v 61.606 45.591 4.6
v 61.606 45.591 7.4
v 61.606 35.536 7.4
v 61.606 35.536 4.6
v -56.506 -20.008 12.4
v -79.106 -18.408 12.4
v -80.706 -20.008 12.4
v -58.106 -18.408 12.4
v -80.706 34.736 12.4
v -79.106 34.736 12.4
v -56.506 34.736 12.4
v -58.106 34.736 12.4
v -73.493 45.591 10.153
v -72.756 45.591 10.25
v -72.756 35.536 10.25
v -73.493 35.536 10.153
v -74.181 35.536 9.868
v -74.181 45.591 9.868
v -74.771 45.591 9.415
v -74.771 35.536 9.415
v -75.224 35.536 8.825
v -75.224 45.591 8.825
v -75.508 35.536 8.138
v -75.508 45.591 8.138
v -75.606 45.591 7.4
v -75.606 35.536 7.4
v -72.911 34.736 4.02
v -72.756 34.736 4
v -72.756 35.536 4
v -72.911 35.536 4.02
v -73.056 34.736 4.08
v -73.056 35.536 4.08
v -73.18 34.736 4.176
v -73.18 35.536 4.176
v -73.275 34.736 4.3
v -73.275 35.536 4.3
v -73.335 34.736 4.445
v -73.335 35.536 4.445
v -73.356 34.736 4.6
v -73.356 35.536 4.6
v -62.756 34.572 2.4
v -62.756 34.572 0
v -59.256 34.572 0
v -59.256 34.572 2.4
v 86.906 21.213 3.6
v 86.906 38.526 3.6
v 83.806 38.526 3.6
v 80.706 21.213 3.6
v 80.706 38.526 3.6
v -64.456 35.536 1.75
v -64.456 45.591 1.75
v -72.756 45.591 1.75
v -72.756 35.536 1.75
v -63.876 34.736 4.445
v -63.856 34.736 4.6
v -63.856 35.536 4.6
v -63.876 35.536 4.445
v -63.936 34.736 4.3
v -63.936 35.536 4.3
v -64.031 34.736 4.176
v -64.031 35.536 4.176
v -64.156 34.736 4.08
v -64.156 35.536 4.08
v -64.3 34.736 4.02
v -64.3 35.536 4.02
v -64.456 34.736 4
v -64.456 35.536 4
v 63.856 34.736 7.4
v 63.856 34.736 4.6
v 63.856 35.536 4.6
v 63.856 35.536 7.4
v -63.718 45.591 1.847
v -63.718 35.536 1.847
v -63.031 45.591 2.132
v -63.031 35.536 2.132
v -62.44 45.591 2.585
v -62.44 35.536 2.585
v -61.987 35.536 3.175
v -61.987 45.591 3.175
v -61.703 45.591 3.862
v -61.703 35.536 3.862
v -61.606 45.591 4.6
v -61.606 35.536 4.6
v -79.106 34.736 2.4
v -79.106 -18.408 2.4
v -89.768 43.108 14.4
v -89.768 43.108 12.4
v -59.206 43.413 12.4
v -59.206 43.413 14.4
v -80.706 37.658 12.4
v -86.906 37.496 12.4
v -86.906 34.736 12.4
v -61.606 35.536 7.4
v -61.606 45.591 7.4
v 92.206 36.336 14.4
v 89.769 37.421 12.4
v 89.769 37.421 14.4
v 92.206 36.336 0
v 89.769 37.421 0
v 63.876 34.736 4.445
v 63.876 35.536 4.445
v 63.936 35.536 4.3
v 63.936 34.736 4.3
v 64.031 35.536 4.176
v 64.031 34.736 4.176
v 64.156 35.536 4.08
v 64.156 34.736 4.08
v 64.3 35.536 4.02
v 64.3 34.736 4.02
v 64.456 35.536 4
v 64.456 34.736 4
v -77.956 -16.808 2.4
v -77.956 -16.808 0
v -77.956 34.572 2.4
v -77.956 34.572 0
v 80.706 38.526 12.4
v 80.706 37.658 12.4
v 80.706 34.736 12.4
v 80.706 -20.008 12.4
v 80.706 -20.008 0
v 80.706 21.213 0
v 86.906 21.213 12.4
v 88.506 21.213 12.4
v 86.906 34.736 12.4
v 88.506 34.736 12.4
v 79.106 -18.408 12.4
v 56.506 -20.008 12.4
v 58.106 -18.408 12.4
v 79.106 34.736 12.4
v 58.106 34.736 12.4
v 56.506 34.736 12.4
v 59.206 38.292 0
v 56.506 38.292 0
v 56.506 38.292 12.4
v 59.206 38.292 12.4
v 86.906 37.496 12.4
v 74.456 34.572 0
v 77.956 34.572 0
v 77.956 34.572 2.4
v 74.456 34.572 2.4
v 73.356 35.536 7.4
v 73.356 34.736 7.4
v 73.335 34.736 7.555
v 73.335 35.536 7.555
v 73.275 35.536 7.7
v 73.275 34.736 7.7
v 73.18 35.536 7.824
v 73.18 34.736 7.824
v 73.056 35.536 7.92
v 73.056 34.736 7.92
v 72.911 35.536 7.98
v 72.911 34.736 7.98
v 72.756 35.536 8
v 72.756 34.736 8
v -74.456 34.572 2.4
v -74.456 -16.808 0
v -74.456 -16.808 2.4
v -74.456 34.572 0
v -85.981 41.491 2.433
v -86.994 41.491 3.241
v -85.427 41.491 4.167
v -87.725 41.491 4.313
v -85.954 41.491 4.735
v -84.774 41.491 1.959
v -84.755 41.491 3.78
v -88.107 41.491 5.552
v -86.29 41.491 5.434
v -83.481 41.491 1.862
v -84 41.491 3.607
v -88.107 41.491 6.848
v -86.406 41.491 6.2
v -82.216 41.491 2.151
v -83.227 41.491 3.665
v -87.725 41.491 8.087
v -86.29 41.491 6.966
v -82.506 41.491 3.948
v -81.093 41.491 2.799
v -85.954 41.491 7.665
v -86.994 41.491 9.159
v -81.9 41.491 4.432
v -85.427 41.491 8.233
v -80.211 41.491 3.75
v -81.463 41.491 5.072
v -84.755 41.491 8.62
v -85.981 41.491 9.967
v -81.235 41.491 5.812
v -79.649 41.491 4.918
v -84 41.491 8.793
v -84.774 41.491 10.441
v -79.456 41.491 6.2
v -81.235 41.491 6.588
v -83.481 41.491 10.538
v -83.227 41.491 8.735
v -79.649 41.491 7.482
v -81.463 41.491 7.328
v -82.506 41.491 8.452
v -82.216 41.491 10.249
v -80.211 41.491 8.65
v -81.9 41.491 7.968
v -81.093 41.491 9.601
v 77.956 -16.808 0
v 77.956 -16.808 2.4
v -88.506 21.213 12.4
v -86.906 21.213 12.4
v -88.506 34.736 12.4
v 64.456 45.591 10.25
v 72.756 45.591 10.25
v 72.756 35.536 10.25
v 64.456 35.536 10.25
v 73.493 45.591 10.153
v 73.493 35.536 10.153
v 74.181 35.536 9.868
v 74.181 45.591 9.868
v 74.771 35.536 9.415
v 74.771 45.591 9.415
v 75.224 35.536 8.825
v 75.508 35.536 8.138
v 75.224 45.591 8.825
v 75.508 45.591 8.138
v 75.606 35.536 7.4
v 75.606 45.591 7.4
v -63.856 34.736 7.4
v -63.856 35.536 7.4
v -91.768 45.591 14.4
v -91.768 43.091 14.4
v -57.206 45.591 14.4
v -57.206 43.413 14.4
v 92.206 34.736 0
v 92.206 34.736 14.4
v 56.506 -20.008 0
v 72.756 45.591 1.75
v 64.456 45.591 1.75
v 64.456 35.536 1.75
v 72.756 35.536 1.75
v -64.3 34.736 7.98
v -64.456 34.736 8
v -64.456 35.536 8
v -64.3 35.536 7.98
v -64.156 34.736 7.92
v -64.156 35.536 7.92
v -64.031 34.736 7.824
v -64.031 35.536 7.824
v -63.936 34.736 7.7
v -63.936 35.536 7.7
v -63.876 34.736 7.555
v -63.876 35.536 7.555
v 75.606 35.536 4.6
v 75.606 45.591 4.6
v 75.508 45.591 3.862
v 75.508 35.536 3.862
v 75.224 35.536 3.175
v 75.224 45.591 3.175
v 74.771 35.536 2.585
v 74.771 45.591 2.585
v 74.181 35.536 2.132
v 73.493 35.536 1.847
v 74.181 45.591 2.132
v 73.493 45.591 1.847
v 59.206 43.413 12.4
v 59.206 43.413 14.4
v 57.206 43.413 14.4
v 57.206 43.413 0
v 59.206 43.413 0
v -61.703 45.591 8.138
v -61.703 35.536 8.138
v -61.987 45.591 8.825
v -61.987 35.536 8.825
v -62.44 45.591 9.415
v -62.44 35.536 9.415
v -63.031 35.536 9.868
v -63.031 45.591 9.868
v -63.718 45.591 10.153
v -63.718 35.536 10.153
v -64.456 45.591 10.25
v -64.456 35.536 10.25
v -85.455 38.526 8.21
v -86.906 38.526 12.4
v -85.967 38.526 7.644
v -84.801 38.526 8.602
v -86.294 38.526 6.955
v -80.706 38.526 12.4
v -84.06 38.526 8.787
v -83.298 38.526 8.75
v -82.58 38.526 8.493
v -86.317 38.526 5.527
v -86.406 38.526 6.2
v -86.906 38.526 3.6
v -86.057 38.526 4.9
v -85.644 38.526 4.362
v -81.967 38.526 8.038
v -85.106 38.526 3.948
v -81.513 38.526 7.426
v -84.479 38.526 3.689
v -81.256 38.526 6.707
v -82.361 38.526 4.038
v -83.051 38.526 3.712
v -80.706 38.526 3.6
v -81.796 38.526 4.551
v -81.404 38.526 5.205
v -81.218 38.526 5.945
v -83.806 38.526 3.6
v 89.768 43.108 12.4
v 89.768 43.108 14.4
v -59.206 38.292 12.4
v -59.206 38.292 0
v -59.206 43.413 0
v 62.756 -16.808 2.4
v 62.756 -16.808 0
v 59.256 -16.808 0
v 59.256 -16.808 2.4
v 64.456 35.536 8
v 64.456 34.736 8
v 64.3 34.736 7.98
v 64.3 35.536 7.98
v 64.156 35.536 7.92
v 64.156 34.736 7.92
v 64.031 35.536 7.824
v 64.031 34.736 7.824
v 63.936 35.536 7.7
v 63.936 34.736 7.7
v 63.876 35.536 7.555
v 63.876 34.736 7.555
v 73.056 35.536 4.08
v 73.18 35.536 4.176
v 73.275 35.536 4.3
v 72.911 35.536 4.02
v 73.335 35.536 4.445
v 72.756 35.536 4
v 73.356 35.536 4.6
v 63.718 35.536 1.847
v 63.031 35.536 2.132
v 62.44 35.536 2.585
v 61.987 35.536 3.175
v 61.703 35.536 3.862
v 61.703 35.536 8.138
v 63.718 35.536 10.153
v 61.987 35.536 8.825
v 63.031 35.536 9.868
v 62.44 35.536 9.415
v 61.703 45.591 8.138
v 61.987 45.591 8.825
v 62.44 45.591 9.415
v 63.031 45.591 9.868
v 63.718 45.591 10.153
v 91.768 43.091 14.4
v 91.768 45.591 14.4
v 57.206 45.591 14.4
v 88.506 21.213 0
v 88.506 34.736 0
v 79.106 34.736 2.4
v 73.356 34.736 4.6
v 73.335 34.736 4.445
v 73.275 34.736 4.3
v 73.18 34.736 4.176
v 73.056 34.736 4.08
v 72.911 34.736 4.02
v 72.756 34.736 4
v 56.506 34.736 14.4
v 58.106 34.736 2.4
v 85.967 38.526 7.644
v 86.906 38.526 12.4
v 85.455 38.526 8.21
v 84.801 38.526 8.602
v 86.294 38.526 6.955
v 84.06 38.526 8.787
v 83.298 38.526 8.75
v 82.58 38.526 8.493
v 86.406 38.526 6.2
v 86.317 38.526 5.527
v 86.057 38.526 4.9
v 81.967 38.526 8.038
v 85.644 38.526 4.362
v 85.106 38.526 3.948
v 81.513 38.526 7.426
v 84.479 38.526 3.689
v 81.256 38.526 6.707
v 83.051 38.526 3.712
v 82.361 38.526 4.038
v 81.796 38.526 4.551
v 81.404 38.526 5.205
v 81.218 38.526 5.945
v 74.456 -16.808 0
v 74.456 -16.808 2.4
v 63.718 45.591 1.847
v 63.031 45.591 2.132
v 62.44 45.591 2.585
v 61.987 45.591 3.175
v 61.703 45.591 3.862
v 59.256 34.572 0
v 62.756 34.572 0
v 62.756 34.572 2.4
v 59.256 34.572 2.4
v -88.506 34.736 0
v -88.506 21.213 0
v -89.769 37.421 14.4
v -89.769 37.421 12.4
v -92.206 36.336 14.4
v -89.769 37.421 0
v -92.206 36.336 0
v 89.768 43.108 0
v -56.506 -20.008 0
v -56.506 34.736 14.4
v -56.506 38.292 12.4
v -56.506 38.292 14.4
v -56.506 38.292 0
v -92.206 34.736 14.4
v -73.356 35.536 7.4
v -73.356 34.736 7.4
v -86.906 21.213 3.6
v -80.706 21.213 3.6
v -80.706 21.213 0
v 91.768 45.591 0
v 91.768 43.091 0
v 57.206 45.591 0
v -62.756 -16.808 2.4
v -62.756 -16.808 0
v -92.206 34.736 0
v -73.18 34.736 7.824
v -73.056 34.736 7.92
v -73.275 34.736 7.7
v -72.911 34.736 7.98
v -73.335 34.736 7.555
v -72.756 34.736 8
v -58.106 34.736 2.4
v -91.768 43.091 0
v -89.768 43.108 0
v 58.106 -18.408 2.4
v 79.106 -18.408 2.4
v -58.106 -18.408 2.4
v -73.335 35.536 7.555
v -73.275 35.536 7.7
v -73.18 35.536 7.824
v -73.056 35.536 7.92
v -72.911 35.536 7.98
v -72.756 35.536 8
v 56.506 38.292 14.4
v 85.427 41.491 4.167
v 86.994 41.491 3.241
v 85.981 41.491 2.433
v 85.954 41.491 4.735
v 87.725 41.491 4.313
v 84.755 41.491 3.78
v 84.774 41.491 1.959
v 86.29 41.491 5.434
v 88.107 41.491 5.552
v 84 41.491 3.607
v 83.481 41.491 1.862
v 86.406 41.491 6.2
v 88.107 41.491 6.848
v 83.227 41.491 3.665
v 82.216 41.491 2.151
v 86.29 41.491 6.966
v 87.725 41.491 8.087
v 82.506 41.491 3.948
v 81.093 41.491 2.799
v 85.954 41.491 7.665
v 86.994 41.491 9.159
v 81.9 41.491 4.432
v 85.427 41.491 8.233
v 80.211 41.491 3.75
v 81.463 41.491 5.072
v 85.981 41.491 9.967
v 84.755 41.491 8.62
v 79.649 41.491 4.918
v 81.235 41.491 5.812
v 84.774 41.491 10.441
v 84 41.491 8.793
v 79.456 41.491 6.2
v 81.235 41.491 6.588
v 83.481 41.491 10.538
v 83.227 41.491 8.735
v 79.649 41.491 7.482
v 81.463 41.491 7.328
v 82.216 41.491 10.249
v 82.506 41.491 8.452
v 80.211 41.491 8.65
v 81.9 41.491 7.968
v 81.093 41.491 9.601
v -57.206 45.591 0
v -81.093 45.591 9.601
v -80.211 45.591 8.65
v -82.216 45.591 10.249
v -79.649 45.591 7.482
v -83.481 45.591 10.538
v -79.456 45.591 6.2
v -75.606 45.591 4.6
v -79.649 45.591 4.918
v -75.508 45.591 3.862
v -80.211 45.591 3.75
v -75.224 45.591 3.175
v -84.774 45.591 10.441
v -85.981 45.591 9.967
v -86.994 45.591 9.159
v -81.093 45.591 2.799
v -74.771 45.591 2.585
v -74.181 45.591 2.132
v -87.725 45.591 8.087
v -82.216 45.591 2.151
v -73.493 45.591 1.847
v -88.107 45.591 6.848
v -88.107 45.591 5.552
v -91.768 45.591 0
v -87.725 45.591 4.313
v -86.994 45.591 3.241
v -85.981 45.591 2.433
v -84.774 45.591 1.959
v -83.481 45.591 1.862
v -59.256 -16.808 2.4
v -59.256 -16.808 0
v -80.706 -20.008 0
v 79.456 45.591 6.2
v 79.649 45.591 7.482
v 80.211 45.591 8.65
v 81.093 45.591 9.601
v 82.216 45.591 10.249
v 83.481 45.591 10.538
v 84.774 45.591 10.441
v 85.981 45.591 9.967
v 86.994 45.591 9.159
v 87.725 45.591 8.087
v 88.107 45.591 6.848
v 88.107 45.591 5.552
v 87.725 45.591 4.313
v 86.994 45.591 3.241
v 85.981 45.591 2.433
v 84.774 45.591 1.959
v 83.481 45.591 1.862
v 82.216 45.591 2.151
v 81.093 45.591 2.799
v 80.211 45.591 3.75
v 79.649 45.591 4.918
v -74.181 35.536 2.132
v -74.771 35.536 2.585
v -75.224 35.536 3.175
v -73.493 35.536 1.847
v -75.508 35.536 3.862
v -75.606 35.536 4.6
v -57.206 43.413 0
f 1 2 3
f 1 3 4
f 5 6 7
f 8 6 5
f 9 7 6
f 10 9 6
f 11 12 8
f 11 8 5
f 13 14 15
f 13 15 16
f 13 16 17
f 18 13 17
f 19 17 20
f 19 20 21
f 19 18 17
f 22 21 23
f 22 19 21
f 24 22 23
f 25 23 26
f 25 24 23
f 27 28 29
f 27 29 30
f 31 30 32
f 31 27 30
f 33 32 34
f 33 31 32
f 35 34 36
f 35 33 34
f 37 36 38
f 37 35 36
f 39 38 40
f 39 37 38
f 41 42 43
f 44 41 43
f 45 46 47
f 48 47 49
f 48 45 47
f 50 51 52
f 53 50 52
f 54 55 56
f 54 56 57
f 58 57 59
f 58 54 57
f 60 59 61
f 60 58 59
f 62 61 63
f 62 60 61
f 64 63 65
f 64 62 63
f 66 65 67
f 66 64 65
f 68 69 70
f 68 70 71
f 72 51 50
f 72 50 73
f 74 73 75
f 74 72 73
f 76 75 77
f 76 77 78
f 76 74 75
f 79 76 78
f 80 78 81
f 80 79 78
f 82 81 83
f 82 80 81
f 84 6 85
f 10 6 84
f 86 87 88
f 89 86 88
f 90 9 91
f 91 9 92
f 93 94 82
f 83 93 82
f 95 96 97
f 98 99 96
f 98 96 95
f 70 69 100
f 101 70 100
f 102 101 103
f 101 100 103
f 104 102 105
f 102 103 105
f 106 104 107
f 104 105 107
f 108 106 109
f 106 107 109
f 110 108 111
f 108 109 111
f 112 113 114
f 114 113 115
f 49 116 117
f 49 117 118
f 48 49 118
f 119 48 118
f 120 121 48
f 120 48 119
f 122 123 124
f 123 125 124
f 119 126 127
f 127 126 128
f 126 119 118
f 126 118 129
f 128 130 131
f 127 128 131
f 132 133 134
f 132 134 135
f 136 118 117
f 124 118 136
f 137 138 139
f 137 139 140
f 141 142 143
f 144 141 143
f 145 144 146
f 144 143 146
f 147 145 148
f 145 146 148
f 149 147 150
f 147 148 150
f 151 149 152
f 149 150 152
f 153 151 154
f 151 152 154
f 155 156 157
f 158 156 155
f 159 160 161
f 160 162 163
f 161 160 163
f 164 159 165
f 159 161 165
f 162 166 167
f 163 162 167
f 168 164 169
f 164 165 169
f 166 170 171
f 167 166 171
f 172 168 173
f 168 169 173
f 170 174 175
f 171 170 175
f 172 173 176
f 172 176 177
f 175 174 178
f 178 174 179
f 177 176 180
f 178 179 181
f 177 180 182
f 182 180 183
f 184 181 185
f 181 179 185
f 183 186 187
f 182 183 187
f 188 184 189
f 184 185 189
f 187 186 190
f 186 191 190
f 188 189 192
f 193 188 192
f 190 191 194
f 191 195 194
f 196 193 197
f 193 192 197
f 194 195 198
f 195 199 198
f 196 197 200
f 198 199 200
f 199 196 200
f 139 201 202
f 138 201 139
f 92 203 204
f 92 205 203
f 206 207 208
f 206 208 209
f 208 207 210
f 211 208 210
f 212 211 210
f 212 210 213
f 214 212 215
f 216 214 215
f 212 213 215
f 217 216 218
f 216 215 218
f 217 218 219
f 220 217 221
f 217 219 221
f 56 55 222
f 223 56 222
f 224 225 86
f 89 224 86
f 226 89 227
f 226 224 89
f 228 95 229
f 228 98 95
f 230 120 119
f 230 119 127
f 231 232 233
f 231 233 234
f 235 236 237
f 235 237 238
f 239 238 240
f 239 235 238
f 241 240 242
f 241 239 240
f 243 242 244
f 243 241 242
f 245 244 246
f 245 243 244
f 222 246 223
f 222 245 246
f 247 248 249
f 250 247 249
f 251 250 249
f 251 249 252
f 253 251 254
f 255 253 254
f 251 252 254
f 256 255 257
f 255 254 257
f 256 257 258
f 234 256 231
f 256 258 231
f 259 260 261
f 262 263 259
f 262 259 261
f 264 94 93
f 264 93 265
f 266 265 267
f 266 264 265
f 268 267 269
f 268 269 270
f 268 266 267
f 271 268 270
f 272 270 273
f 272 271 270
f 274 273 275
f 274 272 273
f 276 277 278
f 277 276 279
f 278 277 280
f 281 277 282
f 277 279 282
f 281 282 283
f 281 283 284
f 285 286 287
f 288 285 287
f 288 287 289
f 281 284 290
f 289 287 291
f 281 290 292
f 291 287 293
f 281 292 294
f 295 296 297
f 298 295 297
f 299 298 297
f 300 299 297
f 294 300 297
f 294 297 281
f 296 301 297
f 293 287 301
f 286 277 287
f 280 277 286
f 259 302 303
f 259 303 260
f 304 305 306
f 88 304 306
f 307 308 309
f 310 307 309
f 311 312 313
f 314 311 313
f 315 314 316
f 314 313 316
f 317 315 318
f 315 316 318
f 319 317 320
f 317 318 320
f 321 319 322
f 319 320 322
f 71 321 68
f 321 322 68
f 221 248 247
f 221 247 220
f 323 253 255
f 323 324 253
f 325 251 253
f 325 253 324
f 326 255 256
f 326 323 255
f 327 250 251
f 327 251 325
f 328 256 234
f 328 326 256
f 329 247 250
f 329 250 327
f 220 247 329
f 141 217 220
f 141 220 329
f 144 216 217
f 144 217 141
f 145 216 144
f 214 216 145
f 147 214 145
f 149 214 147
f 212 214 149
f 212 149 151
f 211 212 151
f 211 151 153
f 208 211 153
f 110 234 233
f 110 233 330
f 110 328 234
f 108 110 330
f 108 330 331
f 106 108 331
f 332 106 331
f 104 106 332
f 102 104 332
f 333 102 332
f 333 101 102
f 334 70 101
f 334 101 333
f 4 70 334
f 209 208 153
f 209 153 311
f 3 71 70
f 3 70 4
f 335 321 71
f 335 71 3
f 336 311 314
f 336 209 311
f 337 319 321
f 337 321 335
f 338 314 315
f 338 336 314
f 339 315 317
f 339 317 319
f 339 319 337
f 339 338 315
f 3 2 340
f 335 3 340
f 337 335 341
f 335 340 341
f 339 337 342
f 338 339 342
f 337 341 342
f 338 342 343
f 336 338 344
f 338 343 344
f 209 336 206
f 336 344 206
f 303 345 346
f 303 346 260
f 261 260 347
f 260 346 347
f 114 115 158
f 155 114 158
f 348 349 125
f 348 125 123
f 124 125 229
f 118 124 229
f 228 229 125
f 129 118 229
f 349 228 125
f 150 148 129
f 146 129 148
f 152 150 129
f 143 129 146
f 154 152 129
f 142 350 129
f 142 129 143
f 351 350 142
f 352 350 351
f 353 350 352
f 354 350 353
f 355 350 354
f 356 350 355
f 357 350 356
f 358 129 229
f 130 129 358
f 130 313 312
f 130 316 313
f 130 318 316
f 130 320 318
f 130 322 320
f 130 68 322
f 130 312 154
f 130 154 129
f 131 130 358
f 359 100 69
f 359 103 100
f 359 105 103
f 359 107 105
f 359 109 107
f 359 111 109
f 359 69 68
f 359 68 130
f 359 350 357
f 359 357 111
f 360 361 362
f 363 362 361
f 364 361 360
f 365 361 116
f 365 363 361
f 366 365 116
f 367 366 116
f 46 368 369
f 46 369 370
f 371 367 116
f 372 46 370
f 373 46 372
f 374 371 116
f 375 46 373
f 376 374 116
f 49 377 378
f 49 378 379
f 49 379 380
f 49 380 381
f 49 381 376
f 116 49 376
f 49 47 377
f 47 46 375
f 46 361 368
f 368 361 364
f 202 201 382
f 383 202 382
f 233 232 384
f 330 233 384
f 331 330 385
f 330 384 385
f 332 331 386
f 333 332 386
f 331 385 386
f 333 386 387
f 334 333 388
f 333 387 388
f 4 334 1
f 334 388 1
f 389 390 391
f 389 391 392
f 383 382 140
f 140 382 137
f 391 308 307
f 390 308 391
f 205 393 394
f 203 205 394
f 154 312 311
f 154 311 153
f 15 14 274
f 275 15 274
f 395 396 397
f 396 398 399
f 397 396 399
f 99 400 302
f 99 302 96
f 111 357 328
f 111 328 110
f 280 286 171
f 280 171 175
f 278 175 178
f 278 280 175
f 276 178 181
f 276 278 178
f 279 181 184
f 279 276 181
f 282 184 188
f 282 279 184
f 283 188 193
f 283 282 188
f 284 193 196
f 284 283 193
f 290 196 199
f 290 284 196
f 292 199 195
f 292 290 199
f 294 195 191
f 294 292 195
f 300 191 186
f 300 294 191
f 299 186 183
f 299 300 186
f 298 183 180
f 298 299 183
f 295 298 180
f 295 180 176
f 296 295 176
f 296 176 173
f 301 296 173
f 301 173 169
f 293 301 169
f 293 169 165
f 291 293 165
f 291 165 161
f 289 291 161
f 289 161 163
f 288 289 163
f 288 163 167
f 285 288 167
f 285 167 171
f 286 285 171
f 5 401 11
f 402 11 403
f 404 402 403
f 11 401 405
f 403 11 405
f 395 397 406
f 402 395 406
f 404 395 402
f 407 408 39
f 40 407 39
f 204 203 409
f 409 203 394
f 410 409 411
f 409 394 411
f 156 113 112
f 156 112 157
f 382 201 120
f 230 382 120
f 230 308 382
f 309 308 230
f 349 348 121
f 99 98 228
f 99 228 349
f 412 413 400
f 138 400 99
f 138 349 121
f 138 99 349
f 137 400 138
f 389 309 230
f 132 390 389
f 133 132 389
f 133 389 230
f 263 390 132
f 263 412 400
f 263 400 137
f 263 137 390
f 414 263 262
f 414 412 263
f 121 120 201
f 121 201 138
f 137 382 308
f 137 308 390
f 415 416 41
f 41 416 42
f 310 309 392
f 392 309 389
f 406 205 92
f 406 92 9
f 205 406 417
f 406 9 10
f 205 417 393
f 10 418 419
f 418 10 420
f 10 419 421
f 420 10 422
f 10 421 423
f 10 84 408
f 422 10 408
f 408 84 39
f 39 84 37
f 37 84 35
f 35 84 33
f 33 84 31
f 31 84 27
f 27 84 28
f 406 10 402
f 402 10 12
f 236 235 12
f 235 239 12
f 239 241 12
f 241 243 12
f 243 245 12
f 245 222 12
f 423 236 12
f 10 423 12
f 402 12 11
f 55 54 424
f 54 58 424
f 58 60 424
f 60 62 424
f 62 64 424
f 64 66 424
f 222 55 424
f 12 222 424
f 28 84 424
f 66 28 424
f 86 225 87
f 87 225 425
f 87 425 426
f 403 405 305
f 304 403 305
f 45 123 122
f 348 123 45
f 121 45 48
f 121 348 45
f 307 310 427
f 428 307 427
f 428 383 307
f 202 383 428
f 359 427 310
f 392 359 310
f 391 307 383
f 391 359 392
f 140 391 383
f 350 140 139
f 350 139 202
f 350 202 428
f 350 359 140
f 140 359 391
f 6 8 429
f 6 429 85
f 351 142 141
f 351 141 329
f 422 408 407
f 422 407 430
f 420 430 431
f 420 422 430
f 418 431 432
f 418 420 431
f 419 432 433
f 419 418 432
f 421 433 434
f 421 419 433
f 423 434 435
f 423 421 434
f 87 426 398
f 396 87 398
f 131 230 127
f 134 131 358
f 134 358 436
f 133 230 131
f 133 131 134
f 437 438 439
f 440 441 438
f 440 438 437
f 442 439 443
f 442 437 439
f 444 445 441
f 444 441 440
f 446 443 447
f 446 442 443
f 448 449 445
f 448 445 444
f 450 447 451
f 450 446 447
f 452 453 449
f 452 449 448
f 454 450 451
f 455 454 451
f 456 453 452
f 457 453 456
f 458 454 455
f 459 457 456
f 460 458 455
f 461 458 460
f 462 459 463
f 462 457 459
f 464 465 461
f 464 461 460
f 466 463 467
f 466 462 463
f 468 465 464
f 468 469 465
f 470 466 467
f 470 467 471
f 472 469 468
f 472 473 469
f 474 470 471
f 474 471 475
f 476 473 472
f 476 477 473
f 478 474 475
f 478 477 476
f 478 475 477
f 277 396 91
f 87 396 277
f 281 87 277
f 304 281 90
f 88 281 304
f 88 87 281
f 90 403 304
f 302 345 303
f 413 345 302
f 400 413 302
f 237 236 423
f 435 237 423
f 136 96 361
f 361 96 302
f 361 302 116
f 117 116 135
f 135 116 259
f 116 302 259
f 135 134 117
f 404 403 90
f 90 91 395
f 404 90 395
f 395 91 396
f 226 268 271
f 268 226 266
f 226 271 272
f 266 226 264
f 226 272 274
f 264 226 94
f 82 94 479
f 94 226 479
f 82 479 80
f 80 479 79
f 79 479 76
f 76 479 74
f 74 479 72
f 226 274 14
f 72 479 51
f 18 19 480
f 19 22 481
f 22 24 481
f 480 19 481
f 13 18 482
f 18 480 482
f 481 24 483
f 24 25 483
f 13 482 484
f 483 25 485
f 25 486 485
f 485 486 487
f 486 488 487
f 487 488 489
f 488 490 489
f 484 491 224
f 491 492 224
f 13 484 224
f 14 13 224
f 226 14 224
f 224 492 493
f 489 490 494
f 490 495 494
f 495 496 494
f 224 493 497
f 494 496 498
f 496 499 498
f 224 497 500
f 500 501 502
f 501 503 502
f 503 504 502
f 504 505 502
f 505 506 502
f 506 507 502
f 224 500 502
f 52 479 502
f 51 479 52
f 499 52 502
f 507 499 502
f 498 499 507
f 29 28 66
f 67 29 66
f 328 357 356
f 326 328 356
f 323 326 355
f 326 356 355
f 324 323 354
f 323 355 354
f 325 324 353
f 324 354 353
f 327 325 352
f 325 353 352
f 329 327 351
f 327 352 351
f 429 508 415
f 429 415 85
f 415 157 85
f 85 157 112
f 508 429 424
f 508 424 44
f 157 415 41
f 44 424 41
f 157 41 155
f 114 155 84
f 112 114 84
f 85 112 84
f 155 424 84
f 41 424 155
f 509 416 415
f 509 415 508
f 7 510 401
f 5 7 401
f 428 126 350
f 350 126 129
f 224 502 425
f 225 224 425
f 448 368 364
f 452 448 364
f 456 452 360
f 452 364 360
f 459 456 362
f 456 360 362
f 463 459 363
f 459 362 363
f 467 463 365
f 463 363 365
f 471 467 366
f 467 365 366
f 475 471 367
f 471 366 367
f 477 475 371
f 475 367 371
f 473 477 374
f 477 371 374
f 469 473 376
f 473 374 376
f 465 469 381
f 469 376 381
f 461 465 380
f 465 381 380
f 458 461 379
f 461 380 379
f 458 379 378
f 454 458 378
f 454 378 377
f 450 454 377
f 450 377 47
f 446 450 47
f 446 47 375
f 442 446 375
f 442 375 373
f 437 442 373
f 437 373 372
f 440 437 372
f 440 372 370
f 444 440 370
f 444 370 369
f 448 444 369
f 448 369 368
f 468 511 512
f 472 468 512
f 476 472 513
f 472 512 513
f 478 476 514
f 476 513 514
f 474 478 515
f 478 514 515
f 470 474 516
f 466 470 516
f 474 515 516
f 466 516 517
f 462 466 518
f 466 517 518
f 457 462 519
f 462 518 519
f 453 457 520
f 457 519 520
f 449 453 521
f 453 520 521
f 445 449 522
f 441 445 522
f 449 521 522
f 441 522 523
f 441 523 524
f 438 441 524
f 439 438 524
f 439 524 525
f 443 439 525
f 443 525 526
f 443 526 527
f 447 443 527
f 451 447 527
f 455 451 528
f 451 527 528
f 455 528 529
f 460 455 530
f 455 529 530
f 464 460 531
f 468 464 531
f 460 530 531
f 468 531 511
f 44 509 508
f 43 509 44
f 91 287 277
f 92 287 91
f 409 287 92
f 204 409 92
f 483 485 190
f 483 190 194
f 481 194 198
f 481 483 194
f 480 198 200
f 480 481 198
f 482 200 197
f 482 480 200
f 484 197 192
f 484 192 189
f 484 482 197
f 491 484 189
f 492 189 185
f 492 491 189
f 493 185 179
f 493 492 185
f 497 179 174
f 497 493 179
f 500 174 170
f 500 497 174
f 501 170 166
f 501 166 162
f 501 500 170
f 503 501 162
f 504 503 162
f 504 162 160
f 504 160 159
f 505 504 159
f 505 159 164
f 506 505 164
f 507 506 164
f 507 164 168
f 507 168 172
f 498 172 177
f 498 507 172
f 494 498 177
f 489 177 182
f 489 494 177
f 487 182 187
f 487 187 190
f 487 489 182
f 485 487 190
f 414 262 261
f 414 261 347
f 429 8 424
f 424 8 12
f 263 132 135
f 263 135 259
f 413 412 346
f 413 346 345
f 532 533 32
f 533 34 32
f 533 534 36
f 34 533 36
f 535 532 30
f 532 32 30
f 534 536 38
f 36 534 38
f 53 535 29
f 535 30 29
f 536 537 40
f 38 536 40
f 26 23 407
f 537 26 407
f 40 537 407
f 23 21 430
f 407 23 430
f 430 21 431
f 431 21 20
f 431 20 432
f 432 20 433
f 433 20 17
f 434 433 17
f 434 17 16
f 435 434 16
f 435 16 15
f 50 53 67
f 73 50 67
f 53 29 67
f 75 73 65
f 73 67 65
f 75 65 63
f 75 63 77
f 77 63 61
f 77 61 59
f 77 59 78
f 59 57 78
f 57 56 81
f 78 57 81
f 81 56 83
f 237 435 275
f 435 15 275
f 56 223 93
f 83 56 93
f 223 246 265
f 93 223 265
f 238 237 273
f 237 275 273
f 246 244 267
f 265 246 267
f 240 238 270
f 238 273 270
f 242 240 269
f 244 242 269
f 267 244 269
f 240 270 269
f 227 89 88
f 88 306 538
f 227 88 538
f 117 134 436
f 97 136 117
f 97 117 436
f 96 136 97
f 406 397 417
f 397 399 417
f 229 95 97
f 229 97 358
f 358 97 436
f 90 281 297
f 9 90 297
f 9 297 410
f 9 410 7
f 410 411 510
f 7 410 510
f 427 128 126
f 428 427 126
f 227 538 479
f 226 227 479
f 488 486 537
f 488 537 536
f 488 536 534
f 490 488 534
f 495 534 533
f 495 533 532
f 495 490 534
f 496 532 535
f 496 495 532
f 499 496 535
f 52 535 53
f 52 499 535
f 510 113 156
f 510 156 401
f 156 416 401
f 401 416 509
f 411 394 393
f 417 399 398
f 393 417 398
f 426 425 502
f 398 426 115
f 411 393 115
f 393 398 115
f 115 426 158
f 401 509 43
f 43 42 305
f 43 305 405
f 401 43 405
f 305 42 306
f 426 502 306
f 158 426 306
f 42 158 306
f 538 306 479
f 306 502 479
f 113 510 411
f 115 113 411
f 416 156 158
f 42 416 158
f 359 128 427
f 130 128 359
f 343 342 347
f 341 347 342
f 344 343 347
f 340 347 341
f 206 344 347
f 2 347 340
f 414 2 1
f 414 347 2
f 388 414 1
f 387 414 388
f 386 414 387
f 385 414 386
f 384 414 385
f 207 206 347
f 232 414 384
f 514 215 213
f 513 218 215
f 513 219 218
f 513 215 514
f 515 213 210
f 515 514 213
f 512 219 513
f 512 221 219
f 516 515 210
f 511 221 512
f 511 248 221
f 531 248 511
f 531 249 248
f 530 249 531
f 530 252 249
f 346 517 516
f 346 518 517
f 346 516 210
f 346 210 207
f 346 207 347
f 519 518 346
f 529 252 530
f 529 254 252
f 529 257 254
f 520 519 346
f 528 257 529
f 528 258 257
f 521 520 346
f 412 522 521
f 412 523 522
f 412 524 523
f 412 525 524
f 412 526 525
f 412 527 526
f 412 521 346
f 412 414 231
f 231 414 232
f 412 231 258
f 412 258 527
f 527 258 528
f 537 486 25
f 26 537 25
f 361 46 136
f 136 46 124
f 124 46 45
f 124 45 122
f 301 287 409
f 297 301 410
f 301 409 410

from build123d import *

# Parameters (mm, degrees)
SKETCH008_W     = 3.5
SKETCH008_H     = 51.38
PAD002_DEPTH    = 12.4
PAD003_DEPTH    = 2
SKETCH010_W     = 21
SKETCH010_H     = 53.1439524112
POCKET006_DEPTH = 10
SKETCH011_R     = 2.6
POCKET007_DEPTH = 24.3796707343
POCKET008_DEPTH = 16.2235914112
SKETCH013_R     = 4.35
POCKET009_DEPTH = 4.1
POCKET010_DEPTH = 10.8560793232
POCKET011_DEPTH = 10.0550793232
POCKET_DEPTH    = 1.09
SKETCH016_W     = 3.5
SKETCH016_H     = 51.38
PAD004_DEPTH    = 12.4
PAD005_DEPTH    = 2
SKETCH018_W     = 21
SKETCH018_H     = 53.1439524112
POCKET013_DEPTH = 10
SKETCH019_R     = 2.6
POCKET014_DEPTH = 24.3796707343
POCKET015_DEPTH = 16.2235914112
SKETCH021_R     = 4.35
POCKET016_DEPTH = 4.1
POCKET017_DEPTH = 10.8560793232
POCKET018_DEPTH = 10.0550793232
POCKET012_DEPTH = 1.09


with BuildPart() as body001:
    # Sketch008 → Pad002 (new body)
    with BuildSketch(Plane(origin=(0, 0, 0), x_dir=(-1, 0, 0), z_dir=(0, 0, -1))):
        Polygon((-89.7690858187, 37.4209880882), (-92.205606, 36.3361794112), (-92.205606, 34.7361794112), (-88.505606, 34.7361794112), (-88.505606, 21.212588), (-80.705606, 21.212588), (-80.705606, -20.007773), (-56.505606, -20.007773), (-56.505606, 38.292227), (-59.205606, 38.292227), (-59.205606, 43.412588), (-57.205606, 43.412588), (-57.205606, 45.5912587343), (-91.7678030502, 45.5912587343), (-91.7678030502, 43.0912587343), (-89.7678755353, 43.1082862119), align=None)
        with Locations((-76.205606, 8.882227)):
            Rectangle(SKETCH008_W, SKETCH008_H, mode=Mode.SUBTRACT)
        with Locations((-61.005606, 8.882227)):
            Rectangle(SKETCH008_W, SKETCH008_H, mode=Mode.SUBTRACT)
    extrude(amount=-PAD002_DEPTH)

    # Sketch009 (on Face26 of Pad002) → Pad003 (join)
    with BuildSketch(Plane.XY.offset(12.4)):
        Polygon((92.205606, 34.7361794112), (56.505606, 34.7361794112), (56.505606, 38.292227), (89.7690858187, 37.4209880882), (92.205606, 36.3361794112), align=None)
        Polygon((59.205606, 43.412588), (57.205606, 43.412588), (57.205606, 45.5912587343), (91.7678030502, 45.5912587343), (91.7678030502, 43.0912587343), (89.7678755353, 43.1082862119), align=None)
    extrude(amount=PAD003_DEPTH)

    # Sketch010 (on Face36 of Pad003) → Pocket006 (cut)
    with BuildSketch(Plane.XY.offset(12.4)):
        with Locations((68.605606, 8.1642032056)):
            Rectangle(SKETCH010_W, SKETCH010_H)
    extrude(amount=-POCKET006_DEPTH, mode=Mode.SUBTRACT)

    # Sketch011 (on Face12 of Pocket006) → Pocket007 (cut, through all)
    with BuildSketch(Plane.XZ.offset(-21.212588)):
        with Locations((83.805606, 6.2)):
            Circle(SKETCH011_R)
    extrude(amount=-POCKET007_DEPTH, mode=Mode.SUBTRACT)

    # Sketch012 (on Face12 of Pocket007) → Pocket008 (cut)
    with BuildSketch(Plane.XZ.offset(-21.212588)):
        Polygon((86.905606, 8.8), (86.905606, 3.6), (80.705606, 3.6), (80.705606, 8.8), (80.705606, 12.4), (86.905606, 12.4), align=None)
    extrude(amount=-POCKET008_DEPTH, mode=Mode.SUBTRACT)

    # Sketch013 (on Face20 of Pocket008) → Pocket009 (cut)
    with BuildSketch(Plane(origin=(0, 45.5912587343, 0), x_dir=(-1, 0, 0), z_dir=(0, 1, 0))):
        with Locations((-83.805606, 6.2000000001)):
            Circle(SKETCH013_R)
    extrude(amount=-POCKET009_DEPTH, mode=Mode.SUBTRACT)

    # Sketch014 (on Face51 of Pocket009) → Pocket010 (cut, through all)
    with BuildSketch(Plane.XZ.offset(-34.7361794112)):
        with BuildLine():
            ThreePointArc((64.455606, 8), (64.0313419313, 7.8242640687), (63.855606, 7.4))
            Line((63.855606, 4.6), (63.855606, 7.4))
            ThreePointArc((63.855606, 4.6), (64.0313419313, 4.1757359313), (64.455606, 4))
            Line((72.755606, 4), (64.455606, 4))
            ThreePointArc((72.755606, 4), (73.1798700687, 4.1757359313), (73.355606, 4.6))
            Line((73.355606, 7.4), (73.355606, 4.6))
            ThreePointArc((73.355606, 7.4), (73.1798700687, 7.8242640687), (72.755606, 8))
            Line((64.455606, 8), (72.755606, 8))
        make_face()
    extrude(amount=-POCKET010_DEPTH, mode=Mode.SUBTRACT)

    # Sketch015 (on Face20 of Pocket010) → Pocket011 (cut)
    with BuildSketch(Plane(origin=(0, 45.5912587343, 0), x_dir=(-1, 0, 0), z_dir=(0, 1, 0))):
        with BuildLine():
            ThreePointArc((-72.755606, 10.25), (-74.7708603264, 9.4152543264), (-75.605606, 7.4))
            Line((-75.605606, 4.6), (-75.605606, 7.4))
            ThreePointArc((-75.605606, 4.6), (-74.7708603264, 2.5847456736), (-72.755606, 1.75))
            Line((-64.455606, 1.75), (-72.755606, 1.75))
            ThreePointArc((-64.455606, 1.75), (-62.4403516736, 2.5847456736), (-61.605606, 4.6))
            Line((-61.605606, 7.4), (-61.605606, 4.6))
            ThreePointArc((-61.605606, 7.4), (-62.4403516736, 9.4152543264), (-64.455606, 10.25))
            Line((-72.755606, 10.25), (-64.455606, 10.25))
        make_face()
    extrude(amount=-POCKET011_DEPTH, mode=Mode.SUBTRACT)

    # Pocket011 Face60 → Pocket (cut)
    with BuildSketch(Plane(origin=(83.805606, 37.4361794112, 9.147168329), x_dir=(-1, 0, 0), z_dir=(0, -1, 0))):
        Polygon((3.1, 0.347168329), (3.1, 5.547168329), (0, 5.547168329), (-3.1, 5.547168329), (-3.1, 0.347168329), (-3.1, -3.252831671), (3.1, -3.252831671), align=None)
        with BuildLine():
            ThreePointArc((-2.6, 2.947168329), (-1.8384776311, 4.7856459601), (0, 5.547168329))
            ThreePointArc((0, 5.547168329), (1.8384776311, 1.1086906979), (-2.6, 2.947168329))
        make_face(mode=Mode.SUBTRACT)
    extrude(amount=-POCKET_DEPTH, mode=Mode.SUBTRACT)


with BuildPart() as body002:
    # Sketch016 → Pad004 (new body)
    with BuildSketch(Plane(origin=(0, 0, 0), x_dir=(-1, 0, 0), z_dir=(0, 0, -1))):
        Polygon((-89.7690858187, 37.4209880882), (-92.205606, 36.3361794112), (-92.205606, 34.7361794112), (-88.505606, 34.7361794112), (-88.505606, 21.212588), (-80.705606, 21.212588), (-80.705606, -20.007773), (-56.505606, -20.007773), (-56.505606, 38.292227), (-59.205606, 38.292227), (-59.205606, 43.412588), (-57.205606, 43.412588), (-57.205606, 45.5912587343), (-91.7678030502, 45.5912587343), (-91.7678030502, 43.0912587343), (-89.7678755353, 43.1082862119), align=None)
        with Locations((-76.205606, 8.882227)):
            Rectangle(SKETCH016_W, SKETCH016_H, mode=Mode.SUBTRACT)
        with Locations((-61.005606, 8.882227)):
            Rectangle(SKETCH016_W, SKETCH016_H, mode=Mode.SUBTRACT)
    extrude(amount=-PAD004_DEPTH)

    # Sketch017 (on Face26 of Pad004) → Pad005 (join)
    with BuildSketch(Plane.XY.offset(12.4)):
        Polygon((92.205606, 34.7361794112), (56.505606, 34.7361794112), (56.505606, 38.292227), (89.7690858187, 37.4209880882), (92.205606, 36.3361794112), align=None)
        Polygon((59.205606, 43.412588), (57.205606, 43.412588), (57.205606, 45.5912587343), (91.7678030502, 45.5912587343), (91.7678030502, 43.0912587343), (89.7678755353, 43.1082862119), align=None)
    extrude(amount=PAD005_DEPTH)

    # Sketch018 (on Face36 of Pad005) → Pocket013 (cut)
    with BuildSketch(Plane.XY.offset(12.4)):
        with Locations((68.605606, 8.1642032056)):
            Rectangle(SKETCH018_W, SKETCH018_H)
    extrude(amount=-POCKET013_DEPTH, mode=Mode.SUBTRACT)

    # Sketch019 (on Face12 of Pocket013) → Pocket014 (cut, through all)
    with BuildSketch(Plane.XZ.offset(-21.212588)):
        with Locations((83.805606, 6.2)):
            Circle(SKETCH019_R)
    extrude(amount=-POCKET014_DEPTH, mode=Mode.SUBTRACT)

    # Sketch020 (on Face12 of Pocket014) → Pocket015 (cut)
    with BuildSketch(Plane.XZ.offset(-21.212588)):
        Polygon((86.905606, 8.8), (86.905606, 3.6), (80.705606, 3.6), (80.705606, 8.8), (80.705606, 12.4), (86.905606, 12.4), align=None)
    extrude(amount=-POCKET015_DEPTH, mode=Mode.SUBTRACT)

    # Sketch021 (on Face20 of Pocket015) → Pocket016 (cut)
    with BuildSketch(Plane(origin=(0, 45.5912587343, 0), x_dir=(-1, 0, 0), z_dir=(0, 1, 0))):
        with Locations((-83.805606, 6.2000000001)):
            Circle(SKETCH021_R)
    extrude(amount=-POCKET016_DEPTH, mode=Mode.SUBTRACT)

    # Sketch022 (on Face51 of Pocket016) → Pocket017 (cut, through all)
    with BuildSketch(Plane.XZ.offset(-34.7361794112)):
        with BuildLine():
            ThreePointArc((64.455606, 8), (64.0313419313, 7.8242640687), (63.855606, 7.4))
            Line((63.855606, 4.6), (63.855606, 7.4))
            ThreePointArc((63.855606, 4.6), (64.0313419313, 4.1757359313), (64.455606, 4))
            Line((72.755606, 4), (64.455606, 4))
            ThreePointArc((72.755606, 4), (73.1798700687, 4.1757359313), (73.355606, 4.6))
            Line((73.355606, 7.4), (73.355606, 4.6))
            ThreePointArc((73.355606, 7.4), (73.1798700687, 7.8242640687), (72.755606, 8))
            Line((64.455606, 8), (72.755606, 8))
        make_face()
    extrude(amount=-POCKET017_DEPTH, mode=Mode.SUBTRACT)

    # Sketch023 (on Face20 of Pocket017) → Pocket018 (cut)
    with BuildSketch(Plane(origin=(0, 45.5912587343, 0), x_dir=(-1, 0, 0), z_dir=(0, 1, 0))):
        with BuildLine():
            ThreePointArc((-72.755606, 10.25), (-74.7708603264, 9.4152543264), (-75.605606, 7.4))
            Line((-75.605606, 4.6), (-75.605606, 7.4))
            ThreePointArc((-75.605606, 4.6), (-74.7708603264, 2.5847456736), (-72.755606, 1.75))
            Line((-64.455606, 1.75), (-72.755606, 1.75))
            ThreePointArc((-64.455606, 1.75), (-62.4403516736, 2.5847456736), (-61.605606, 4.6))
            Line((-61.605606, 7.4), (-61.605606, 4.6))
            ThreePointArc((-61.605606, 7.4), (-62.4403516736, 9.4152543264), (-64.455606, 10.25))
            Line((-72.755606, 10.25), (-64.455606, 10.25))
        make_face()
    extrude(amount=-POCKET018_DEPTH, mode=Mode.SUBTRACT)

    # Pocket018 Face60 → Pocket012 (cut)
    with BuildSketch(Plane(origin=(83.805606, 37.4361794112, 9.147168329), x_dir=(-1, 0, 0), z_dir=(0, -1, 0))):
        Polygon((3.1, 0.347168329), (3.1, 5.547168329), (0, 5.547168329), (-3.1, 5.547168329), (-3.1, 0.347168329), (-3.1, -3.252831671), (3.1, -3.252831671), align=None)
        with BuildLine():
            ThreePointArc((-2.6, 2.947168329), (-1.8384776311, 4.7856459601), (0, 5.547168329))
            ThreePointArc((0, 5.547168329), (1.8384776311, 1.1086906979), (-2.6, 2.947168329))
        make_face(mode=Mode.SUBTRACT)
    extrude(amount=-POCKET012_DEPTH, mode=Mode.SUBTRACT)


with BuildPart() as part_mirroring:
    # Part__Mirroring: instance of Body002
    add(body002.part.mirror(Plane(origin=(0, 0, 0), x_dir=(0, -1, 0), z_dir=(1, 0, 0))))


solid = Compound([body001.part, part_mirroring.part])
